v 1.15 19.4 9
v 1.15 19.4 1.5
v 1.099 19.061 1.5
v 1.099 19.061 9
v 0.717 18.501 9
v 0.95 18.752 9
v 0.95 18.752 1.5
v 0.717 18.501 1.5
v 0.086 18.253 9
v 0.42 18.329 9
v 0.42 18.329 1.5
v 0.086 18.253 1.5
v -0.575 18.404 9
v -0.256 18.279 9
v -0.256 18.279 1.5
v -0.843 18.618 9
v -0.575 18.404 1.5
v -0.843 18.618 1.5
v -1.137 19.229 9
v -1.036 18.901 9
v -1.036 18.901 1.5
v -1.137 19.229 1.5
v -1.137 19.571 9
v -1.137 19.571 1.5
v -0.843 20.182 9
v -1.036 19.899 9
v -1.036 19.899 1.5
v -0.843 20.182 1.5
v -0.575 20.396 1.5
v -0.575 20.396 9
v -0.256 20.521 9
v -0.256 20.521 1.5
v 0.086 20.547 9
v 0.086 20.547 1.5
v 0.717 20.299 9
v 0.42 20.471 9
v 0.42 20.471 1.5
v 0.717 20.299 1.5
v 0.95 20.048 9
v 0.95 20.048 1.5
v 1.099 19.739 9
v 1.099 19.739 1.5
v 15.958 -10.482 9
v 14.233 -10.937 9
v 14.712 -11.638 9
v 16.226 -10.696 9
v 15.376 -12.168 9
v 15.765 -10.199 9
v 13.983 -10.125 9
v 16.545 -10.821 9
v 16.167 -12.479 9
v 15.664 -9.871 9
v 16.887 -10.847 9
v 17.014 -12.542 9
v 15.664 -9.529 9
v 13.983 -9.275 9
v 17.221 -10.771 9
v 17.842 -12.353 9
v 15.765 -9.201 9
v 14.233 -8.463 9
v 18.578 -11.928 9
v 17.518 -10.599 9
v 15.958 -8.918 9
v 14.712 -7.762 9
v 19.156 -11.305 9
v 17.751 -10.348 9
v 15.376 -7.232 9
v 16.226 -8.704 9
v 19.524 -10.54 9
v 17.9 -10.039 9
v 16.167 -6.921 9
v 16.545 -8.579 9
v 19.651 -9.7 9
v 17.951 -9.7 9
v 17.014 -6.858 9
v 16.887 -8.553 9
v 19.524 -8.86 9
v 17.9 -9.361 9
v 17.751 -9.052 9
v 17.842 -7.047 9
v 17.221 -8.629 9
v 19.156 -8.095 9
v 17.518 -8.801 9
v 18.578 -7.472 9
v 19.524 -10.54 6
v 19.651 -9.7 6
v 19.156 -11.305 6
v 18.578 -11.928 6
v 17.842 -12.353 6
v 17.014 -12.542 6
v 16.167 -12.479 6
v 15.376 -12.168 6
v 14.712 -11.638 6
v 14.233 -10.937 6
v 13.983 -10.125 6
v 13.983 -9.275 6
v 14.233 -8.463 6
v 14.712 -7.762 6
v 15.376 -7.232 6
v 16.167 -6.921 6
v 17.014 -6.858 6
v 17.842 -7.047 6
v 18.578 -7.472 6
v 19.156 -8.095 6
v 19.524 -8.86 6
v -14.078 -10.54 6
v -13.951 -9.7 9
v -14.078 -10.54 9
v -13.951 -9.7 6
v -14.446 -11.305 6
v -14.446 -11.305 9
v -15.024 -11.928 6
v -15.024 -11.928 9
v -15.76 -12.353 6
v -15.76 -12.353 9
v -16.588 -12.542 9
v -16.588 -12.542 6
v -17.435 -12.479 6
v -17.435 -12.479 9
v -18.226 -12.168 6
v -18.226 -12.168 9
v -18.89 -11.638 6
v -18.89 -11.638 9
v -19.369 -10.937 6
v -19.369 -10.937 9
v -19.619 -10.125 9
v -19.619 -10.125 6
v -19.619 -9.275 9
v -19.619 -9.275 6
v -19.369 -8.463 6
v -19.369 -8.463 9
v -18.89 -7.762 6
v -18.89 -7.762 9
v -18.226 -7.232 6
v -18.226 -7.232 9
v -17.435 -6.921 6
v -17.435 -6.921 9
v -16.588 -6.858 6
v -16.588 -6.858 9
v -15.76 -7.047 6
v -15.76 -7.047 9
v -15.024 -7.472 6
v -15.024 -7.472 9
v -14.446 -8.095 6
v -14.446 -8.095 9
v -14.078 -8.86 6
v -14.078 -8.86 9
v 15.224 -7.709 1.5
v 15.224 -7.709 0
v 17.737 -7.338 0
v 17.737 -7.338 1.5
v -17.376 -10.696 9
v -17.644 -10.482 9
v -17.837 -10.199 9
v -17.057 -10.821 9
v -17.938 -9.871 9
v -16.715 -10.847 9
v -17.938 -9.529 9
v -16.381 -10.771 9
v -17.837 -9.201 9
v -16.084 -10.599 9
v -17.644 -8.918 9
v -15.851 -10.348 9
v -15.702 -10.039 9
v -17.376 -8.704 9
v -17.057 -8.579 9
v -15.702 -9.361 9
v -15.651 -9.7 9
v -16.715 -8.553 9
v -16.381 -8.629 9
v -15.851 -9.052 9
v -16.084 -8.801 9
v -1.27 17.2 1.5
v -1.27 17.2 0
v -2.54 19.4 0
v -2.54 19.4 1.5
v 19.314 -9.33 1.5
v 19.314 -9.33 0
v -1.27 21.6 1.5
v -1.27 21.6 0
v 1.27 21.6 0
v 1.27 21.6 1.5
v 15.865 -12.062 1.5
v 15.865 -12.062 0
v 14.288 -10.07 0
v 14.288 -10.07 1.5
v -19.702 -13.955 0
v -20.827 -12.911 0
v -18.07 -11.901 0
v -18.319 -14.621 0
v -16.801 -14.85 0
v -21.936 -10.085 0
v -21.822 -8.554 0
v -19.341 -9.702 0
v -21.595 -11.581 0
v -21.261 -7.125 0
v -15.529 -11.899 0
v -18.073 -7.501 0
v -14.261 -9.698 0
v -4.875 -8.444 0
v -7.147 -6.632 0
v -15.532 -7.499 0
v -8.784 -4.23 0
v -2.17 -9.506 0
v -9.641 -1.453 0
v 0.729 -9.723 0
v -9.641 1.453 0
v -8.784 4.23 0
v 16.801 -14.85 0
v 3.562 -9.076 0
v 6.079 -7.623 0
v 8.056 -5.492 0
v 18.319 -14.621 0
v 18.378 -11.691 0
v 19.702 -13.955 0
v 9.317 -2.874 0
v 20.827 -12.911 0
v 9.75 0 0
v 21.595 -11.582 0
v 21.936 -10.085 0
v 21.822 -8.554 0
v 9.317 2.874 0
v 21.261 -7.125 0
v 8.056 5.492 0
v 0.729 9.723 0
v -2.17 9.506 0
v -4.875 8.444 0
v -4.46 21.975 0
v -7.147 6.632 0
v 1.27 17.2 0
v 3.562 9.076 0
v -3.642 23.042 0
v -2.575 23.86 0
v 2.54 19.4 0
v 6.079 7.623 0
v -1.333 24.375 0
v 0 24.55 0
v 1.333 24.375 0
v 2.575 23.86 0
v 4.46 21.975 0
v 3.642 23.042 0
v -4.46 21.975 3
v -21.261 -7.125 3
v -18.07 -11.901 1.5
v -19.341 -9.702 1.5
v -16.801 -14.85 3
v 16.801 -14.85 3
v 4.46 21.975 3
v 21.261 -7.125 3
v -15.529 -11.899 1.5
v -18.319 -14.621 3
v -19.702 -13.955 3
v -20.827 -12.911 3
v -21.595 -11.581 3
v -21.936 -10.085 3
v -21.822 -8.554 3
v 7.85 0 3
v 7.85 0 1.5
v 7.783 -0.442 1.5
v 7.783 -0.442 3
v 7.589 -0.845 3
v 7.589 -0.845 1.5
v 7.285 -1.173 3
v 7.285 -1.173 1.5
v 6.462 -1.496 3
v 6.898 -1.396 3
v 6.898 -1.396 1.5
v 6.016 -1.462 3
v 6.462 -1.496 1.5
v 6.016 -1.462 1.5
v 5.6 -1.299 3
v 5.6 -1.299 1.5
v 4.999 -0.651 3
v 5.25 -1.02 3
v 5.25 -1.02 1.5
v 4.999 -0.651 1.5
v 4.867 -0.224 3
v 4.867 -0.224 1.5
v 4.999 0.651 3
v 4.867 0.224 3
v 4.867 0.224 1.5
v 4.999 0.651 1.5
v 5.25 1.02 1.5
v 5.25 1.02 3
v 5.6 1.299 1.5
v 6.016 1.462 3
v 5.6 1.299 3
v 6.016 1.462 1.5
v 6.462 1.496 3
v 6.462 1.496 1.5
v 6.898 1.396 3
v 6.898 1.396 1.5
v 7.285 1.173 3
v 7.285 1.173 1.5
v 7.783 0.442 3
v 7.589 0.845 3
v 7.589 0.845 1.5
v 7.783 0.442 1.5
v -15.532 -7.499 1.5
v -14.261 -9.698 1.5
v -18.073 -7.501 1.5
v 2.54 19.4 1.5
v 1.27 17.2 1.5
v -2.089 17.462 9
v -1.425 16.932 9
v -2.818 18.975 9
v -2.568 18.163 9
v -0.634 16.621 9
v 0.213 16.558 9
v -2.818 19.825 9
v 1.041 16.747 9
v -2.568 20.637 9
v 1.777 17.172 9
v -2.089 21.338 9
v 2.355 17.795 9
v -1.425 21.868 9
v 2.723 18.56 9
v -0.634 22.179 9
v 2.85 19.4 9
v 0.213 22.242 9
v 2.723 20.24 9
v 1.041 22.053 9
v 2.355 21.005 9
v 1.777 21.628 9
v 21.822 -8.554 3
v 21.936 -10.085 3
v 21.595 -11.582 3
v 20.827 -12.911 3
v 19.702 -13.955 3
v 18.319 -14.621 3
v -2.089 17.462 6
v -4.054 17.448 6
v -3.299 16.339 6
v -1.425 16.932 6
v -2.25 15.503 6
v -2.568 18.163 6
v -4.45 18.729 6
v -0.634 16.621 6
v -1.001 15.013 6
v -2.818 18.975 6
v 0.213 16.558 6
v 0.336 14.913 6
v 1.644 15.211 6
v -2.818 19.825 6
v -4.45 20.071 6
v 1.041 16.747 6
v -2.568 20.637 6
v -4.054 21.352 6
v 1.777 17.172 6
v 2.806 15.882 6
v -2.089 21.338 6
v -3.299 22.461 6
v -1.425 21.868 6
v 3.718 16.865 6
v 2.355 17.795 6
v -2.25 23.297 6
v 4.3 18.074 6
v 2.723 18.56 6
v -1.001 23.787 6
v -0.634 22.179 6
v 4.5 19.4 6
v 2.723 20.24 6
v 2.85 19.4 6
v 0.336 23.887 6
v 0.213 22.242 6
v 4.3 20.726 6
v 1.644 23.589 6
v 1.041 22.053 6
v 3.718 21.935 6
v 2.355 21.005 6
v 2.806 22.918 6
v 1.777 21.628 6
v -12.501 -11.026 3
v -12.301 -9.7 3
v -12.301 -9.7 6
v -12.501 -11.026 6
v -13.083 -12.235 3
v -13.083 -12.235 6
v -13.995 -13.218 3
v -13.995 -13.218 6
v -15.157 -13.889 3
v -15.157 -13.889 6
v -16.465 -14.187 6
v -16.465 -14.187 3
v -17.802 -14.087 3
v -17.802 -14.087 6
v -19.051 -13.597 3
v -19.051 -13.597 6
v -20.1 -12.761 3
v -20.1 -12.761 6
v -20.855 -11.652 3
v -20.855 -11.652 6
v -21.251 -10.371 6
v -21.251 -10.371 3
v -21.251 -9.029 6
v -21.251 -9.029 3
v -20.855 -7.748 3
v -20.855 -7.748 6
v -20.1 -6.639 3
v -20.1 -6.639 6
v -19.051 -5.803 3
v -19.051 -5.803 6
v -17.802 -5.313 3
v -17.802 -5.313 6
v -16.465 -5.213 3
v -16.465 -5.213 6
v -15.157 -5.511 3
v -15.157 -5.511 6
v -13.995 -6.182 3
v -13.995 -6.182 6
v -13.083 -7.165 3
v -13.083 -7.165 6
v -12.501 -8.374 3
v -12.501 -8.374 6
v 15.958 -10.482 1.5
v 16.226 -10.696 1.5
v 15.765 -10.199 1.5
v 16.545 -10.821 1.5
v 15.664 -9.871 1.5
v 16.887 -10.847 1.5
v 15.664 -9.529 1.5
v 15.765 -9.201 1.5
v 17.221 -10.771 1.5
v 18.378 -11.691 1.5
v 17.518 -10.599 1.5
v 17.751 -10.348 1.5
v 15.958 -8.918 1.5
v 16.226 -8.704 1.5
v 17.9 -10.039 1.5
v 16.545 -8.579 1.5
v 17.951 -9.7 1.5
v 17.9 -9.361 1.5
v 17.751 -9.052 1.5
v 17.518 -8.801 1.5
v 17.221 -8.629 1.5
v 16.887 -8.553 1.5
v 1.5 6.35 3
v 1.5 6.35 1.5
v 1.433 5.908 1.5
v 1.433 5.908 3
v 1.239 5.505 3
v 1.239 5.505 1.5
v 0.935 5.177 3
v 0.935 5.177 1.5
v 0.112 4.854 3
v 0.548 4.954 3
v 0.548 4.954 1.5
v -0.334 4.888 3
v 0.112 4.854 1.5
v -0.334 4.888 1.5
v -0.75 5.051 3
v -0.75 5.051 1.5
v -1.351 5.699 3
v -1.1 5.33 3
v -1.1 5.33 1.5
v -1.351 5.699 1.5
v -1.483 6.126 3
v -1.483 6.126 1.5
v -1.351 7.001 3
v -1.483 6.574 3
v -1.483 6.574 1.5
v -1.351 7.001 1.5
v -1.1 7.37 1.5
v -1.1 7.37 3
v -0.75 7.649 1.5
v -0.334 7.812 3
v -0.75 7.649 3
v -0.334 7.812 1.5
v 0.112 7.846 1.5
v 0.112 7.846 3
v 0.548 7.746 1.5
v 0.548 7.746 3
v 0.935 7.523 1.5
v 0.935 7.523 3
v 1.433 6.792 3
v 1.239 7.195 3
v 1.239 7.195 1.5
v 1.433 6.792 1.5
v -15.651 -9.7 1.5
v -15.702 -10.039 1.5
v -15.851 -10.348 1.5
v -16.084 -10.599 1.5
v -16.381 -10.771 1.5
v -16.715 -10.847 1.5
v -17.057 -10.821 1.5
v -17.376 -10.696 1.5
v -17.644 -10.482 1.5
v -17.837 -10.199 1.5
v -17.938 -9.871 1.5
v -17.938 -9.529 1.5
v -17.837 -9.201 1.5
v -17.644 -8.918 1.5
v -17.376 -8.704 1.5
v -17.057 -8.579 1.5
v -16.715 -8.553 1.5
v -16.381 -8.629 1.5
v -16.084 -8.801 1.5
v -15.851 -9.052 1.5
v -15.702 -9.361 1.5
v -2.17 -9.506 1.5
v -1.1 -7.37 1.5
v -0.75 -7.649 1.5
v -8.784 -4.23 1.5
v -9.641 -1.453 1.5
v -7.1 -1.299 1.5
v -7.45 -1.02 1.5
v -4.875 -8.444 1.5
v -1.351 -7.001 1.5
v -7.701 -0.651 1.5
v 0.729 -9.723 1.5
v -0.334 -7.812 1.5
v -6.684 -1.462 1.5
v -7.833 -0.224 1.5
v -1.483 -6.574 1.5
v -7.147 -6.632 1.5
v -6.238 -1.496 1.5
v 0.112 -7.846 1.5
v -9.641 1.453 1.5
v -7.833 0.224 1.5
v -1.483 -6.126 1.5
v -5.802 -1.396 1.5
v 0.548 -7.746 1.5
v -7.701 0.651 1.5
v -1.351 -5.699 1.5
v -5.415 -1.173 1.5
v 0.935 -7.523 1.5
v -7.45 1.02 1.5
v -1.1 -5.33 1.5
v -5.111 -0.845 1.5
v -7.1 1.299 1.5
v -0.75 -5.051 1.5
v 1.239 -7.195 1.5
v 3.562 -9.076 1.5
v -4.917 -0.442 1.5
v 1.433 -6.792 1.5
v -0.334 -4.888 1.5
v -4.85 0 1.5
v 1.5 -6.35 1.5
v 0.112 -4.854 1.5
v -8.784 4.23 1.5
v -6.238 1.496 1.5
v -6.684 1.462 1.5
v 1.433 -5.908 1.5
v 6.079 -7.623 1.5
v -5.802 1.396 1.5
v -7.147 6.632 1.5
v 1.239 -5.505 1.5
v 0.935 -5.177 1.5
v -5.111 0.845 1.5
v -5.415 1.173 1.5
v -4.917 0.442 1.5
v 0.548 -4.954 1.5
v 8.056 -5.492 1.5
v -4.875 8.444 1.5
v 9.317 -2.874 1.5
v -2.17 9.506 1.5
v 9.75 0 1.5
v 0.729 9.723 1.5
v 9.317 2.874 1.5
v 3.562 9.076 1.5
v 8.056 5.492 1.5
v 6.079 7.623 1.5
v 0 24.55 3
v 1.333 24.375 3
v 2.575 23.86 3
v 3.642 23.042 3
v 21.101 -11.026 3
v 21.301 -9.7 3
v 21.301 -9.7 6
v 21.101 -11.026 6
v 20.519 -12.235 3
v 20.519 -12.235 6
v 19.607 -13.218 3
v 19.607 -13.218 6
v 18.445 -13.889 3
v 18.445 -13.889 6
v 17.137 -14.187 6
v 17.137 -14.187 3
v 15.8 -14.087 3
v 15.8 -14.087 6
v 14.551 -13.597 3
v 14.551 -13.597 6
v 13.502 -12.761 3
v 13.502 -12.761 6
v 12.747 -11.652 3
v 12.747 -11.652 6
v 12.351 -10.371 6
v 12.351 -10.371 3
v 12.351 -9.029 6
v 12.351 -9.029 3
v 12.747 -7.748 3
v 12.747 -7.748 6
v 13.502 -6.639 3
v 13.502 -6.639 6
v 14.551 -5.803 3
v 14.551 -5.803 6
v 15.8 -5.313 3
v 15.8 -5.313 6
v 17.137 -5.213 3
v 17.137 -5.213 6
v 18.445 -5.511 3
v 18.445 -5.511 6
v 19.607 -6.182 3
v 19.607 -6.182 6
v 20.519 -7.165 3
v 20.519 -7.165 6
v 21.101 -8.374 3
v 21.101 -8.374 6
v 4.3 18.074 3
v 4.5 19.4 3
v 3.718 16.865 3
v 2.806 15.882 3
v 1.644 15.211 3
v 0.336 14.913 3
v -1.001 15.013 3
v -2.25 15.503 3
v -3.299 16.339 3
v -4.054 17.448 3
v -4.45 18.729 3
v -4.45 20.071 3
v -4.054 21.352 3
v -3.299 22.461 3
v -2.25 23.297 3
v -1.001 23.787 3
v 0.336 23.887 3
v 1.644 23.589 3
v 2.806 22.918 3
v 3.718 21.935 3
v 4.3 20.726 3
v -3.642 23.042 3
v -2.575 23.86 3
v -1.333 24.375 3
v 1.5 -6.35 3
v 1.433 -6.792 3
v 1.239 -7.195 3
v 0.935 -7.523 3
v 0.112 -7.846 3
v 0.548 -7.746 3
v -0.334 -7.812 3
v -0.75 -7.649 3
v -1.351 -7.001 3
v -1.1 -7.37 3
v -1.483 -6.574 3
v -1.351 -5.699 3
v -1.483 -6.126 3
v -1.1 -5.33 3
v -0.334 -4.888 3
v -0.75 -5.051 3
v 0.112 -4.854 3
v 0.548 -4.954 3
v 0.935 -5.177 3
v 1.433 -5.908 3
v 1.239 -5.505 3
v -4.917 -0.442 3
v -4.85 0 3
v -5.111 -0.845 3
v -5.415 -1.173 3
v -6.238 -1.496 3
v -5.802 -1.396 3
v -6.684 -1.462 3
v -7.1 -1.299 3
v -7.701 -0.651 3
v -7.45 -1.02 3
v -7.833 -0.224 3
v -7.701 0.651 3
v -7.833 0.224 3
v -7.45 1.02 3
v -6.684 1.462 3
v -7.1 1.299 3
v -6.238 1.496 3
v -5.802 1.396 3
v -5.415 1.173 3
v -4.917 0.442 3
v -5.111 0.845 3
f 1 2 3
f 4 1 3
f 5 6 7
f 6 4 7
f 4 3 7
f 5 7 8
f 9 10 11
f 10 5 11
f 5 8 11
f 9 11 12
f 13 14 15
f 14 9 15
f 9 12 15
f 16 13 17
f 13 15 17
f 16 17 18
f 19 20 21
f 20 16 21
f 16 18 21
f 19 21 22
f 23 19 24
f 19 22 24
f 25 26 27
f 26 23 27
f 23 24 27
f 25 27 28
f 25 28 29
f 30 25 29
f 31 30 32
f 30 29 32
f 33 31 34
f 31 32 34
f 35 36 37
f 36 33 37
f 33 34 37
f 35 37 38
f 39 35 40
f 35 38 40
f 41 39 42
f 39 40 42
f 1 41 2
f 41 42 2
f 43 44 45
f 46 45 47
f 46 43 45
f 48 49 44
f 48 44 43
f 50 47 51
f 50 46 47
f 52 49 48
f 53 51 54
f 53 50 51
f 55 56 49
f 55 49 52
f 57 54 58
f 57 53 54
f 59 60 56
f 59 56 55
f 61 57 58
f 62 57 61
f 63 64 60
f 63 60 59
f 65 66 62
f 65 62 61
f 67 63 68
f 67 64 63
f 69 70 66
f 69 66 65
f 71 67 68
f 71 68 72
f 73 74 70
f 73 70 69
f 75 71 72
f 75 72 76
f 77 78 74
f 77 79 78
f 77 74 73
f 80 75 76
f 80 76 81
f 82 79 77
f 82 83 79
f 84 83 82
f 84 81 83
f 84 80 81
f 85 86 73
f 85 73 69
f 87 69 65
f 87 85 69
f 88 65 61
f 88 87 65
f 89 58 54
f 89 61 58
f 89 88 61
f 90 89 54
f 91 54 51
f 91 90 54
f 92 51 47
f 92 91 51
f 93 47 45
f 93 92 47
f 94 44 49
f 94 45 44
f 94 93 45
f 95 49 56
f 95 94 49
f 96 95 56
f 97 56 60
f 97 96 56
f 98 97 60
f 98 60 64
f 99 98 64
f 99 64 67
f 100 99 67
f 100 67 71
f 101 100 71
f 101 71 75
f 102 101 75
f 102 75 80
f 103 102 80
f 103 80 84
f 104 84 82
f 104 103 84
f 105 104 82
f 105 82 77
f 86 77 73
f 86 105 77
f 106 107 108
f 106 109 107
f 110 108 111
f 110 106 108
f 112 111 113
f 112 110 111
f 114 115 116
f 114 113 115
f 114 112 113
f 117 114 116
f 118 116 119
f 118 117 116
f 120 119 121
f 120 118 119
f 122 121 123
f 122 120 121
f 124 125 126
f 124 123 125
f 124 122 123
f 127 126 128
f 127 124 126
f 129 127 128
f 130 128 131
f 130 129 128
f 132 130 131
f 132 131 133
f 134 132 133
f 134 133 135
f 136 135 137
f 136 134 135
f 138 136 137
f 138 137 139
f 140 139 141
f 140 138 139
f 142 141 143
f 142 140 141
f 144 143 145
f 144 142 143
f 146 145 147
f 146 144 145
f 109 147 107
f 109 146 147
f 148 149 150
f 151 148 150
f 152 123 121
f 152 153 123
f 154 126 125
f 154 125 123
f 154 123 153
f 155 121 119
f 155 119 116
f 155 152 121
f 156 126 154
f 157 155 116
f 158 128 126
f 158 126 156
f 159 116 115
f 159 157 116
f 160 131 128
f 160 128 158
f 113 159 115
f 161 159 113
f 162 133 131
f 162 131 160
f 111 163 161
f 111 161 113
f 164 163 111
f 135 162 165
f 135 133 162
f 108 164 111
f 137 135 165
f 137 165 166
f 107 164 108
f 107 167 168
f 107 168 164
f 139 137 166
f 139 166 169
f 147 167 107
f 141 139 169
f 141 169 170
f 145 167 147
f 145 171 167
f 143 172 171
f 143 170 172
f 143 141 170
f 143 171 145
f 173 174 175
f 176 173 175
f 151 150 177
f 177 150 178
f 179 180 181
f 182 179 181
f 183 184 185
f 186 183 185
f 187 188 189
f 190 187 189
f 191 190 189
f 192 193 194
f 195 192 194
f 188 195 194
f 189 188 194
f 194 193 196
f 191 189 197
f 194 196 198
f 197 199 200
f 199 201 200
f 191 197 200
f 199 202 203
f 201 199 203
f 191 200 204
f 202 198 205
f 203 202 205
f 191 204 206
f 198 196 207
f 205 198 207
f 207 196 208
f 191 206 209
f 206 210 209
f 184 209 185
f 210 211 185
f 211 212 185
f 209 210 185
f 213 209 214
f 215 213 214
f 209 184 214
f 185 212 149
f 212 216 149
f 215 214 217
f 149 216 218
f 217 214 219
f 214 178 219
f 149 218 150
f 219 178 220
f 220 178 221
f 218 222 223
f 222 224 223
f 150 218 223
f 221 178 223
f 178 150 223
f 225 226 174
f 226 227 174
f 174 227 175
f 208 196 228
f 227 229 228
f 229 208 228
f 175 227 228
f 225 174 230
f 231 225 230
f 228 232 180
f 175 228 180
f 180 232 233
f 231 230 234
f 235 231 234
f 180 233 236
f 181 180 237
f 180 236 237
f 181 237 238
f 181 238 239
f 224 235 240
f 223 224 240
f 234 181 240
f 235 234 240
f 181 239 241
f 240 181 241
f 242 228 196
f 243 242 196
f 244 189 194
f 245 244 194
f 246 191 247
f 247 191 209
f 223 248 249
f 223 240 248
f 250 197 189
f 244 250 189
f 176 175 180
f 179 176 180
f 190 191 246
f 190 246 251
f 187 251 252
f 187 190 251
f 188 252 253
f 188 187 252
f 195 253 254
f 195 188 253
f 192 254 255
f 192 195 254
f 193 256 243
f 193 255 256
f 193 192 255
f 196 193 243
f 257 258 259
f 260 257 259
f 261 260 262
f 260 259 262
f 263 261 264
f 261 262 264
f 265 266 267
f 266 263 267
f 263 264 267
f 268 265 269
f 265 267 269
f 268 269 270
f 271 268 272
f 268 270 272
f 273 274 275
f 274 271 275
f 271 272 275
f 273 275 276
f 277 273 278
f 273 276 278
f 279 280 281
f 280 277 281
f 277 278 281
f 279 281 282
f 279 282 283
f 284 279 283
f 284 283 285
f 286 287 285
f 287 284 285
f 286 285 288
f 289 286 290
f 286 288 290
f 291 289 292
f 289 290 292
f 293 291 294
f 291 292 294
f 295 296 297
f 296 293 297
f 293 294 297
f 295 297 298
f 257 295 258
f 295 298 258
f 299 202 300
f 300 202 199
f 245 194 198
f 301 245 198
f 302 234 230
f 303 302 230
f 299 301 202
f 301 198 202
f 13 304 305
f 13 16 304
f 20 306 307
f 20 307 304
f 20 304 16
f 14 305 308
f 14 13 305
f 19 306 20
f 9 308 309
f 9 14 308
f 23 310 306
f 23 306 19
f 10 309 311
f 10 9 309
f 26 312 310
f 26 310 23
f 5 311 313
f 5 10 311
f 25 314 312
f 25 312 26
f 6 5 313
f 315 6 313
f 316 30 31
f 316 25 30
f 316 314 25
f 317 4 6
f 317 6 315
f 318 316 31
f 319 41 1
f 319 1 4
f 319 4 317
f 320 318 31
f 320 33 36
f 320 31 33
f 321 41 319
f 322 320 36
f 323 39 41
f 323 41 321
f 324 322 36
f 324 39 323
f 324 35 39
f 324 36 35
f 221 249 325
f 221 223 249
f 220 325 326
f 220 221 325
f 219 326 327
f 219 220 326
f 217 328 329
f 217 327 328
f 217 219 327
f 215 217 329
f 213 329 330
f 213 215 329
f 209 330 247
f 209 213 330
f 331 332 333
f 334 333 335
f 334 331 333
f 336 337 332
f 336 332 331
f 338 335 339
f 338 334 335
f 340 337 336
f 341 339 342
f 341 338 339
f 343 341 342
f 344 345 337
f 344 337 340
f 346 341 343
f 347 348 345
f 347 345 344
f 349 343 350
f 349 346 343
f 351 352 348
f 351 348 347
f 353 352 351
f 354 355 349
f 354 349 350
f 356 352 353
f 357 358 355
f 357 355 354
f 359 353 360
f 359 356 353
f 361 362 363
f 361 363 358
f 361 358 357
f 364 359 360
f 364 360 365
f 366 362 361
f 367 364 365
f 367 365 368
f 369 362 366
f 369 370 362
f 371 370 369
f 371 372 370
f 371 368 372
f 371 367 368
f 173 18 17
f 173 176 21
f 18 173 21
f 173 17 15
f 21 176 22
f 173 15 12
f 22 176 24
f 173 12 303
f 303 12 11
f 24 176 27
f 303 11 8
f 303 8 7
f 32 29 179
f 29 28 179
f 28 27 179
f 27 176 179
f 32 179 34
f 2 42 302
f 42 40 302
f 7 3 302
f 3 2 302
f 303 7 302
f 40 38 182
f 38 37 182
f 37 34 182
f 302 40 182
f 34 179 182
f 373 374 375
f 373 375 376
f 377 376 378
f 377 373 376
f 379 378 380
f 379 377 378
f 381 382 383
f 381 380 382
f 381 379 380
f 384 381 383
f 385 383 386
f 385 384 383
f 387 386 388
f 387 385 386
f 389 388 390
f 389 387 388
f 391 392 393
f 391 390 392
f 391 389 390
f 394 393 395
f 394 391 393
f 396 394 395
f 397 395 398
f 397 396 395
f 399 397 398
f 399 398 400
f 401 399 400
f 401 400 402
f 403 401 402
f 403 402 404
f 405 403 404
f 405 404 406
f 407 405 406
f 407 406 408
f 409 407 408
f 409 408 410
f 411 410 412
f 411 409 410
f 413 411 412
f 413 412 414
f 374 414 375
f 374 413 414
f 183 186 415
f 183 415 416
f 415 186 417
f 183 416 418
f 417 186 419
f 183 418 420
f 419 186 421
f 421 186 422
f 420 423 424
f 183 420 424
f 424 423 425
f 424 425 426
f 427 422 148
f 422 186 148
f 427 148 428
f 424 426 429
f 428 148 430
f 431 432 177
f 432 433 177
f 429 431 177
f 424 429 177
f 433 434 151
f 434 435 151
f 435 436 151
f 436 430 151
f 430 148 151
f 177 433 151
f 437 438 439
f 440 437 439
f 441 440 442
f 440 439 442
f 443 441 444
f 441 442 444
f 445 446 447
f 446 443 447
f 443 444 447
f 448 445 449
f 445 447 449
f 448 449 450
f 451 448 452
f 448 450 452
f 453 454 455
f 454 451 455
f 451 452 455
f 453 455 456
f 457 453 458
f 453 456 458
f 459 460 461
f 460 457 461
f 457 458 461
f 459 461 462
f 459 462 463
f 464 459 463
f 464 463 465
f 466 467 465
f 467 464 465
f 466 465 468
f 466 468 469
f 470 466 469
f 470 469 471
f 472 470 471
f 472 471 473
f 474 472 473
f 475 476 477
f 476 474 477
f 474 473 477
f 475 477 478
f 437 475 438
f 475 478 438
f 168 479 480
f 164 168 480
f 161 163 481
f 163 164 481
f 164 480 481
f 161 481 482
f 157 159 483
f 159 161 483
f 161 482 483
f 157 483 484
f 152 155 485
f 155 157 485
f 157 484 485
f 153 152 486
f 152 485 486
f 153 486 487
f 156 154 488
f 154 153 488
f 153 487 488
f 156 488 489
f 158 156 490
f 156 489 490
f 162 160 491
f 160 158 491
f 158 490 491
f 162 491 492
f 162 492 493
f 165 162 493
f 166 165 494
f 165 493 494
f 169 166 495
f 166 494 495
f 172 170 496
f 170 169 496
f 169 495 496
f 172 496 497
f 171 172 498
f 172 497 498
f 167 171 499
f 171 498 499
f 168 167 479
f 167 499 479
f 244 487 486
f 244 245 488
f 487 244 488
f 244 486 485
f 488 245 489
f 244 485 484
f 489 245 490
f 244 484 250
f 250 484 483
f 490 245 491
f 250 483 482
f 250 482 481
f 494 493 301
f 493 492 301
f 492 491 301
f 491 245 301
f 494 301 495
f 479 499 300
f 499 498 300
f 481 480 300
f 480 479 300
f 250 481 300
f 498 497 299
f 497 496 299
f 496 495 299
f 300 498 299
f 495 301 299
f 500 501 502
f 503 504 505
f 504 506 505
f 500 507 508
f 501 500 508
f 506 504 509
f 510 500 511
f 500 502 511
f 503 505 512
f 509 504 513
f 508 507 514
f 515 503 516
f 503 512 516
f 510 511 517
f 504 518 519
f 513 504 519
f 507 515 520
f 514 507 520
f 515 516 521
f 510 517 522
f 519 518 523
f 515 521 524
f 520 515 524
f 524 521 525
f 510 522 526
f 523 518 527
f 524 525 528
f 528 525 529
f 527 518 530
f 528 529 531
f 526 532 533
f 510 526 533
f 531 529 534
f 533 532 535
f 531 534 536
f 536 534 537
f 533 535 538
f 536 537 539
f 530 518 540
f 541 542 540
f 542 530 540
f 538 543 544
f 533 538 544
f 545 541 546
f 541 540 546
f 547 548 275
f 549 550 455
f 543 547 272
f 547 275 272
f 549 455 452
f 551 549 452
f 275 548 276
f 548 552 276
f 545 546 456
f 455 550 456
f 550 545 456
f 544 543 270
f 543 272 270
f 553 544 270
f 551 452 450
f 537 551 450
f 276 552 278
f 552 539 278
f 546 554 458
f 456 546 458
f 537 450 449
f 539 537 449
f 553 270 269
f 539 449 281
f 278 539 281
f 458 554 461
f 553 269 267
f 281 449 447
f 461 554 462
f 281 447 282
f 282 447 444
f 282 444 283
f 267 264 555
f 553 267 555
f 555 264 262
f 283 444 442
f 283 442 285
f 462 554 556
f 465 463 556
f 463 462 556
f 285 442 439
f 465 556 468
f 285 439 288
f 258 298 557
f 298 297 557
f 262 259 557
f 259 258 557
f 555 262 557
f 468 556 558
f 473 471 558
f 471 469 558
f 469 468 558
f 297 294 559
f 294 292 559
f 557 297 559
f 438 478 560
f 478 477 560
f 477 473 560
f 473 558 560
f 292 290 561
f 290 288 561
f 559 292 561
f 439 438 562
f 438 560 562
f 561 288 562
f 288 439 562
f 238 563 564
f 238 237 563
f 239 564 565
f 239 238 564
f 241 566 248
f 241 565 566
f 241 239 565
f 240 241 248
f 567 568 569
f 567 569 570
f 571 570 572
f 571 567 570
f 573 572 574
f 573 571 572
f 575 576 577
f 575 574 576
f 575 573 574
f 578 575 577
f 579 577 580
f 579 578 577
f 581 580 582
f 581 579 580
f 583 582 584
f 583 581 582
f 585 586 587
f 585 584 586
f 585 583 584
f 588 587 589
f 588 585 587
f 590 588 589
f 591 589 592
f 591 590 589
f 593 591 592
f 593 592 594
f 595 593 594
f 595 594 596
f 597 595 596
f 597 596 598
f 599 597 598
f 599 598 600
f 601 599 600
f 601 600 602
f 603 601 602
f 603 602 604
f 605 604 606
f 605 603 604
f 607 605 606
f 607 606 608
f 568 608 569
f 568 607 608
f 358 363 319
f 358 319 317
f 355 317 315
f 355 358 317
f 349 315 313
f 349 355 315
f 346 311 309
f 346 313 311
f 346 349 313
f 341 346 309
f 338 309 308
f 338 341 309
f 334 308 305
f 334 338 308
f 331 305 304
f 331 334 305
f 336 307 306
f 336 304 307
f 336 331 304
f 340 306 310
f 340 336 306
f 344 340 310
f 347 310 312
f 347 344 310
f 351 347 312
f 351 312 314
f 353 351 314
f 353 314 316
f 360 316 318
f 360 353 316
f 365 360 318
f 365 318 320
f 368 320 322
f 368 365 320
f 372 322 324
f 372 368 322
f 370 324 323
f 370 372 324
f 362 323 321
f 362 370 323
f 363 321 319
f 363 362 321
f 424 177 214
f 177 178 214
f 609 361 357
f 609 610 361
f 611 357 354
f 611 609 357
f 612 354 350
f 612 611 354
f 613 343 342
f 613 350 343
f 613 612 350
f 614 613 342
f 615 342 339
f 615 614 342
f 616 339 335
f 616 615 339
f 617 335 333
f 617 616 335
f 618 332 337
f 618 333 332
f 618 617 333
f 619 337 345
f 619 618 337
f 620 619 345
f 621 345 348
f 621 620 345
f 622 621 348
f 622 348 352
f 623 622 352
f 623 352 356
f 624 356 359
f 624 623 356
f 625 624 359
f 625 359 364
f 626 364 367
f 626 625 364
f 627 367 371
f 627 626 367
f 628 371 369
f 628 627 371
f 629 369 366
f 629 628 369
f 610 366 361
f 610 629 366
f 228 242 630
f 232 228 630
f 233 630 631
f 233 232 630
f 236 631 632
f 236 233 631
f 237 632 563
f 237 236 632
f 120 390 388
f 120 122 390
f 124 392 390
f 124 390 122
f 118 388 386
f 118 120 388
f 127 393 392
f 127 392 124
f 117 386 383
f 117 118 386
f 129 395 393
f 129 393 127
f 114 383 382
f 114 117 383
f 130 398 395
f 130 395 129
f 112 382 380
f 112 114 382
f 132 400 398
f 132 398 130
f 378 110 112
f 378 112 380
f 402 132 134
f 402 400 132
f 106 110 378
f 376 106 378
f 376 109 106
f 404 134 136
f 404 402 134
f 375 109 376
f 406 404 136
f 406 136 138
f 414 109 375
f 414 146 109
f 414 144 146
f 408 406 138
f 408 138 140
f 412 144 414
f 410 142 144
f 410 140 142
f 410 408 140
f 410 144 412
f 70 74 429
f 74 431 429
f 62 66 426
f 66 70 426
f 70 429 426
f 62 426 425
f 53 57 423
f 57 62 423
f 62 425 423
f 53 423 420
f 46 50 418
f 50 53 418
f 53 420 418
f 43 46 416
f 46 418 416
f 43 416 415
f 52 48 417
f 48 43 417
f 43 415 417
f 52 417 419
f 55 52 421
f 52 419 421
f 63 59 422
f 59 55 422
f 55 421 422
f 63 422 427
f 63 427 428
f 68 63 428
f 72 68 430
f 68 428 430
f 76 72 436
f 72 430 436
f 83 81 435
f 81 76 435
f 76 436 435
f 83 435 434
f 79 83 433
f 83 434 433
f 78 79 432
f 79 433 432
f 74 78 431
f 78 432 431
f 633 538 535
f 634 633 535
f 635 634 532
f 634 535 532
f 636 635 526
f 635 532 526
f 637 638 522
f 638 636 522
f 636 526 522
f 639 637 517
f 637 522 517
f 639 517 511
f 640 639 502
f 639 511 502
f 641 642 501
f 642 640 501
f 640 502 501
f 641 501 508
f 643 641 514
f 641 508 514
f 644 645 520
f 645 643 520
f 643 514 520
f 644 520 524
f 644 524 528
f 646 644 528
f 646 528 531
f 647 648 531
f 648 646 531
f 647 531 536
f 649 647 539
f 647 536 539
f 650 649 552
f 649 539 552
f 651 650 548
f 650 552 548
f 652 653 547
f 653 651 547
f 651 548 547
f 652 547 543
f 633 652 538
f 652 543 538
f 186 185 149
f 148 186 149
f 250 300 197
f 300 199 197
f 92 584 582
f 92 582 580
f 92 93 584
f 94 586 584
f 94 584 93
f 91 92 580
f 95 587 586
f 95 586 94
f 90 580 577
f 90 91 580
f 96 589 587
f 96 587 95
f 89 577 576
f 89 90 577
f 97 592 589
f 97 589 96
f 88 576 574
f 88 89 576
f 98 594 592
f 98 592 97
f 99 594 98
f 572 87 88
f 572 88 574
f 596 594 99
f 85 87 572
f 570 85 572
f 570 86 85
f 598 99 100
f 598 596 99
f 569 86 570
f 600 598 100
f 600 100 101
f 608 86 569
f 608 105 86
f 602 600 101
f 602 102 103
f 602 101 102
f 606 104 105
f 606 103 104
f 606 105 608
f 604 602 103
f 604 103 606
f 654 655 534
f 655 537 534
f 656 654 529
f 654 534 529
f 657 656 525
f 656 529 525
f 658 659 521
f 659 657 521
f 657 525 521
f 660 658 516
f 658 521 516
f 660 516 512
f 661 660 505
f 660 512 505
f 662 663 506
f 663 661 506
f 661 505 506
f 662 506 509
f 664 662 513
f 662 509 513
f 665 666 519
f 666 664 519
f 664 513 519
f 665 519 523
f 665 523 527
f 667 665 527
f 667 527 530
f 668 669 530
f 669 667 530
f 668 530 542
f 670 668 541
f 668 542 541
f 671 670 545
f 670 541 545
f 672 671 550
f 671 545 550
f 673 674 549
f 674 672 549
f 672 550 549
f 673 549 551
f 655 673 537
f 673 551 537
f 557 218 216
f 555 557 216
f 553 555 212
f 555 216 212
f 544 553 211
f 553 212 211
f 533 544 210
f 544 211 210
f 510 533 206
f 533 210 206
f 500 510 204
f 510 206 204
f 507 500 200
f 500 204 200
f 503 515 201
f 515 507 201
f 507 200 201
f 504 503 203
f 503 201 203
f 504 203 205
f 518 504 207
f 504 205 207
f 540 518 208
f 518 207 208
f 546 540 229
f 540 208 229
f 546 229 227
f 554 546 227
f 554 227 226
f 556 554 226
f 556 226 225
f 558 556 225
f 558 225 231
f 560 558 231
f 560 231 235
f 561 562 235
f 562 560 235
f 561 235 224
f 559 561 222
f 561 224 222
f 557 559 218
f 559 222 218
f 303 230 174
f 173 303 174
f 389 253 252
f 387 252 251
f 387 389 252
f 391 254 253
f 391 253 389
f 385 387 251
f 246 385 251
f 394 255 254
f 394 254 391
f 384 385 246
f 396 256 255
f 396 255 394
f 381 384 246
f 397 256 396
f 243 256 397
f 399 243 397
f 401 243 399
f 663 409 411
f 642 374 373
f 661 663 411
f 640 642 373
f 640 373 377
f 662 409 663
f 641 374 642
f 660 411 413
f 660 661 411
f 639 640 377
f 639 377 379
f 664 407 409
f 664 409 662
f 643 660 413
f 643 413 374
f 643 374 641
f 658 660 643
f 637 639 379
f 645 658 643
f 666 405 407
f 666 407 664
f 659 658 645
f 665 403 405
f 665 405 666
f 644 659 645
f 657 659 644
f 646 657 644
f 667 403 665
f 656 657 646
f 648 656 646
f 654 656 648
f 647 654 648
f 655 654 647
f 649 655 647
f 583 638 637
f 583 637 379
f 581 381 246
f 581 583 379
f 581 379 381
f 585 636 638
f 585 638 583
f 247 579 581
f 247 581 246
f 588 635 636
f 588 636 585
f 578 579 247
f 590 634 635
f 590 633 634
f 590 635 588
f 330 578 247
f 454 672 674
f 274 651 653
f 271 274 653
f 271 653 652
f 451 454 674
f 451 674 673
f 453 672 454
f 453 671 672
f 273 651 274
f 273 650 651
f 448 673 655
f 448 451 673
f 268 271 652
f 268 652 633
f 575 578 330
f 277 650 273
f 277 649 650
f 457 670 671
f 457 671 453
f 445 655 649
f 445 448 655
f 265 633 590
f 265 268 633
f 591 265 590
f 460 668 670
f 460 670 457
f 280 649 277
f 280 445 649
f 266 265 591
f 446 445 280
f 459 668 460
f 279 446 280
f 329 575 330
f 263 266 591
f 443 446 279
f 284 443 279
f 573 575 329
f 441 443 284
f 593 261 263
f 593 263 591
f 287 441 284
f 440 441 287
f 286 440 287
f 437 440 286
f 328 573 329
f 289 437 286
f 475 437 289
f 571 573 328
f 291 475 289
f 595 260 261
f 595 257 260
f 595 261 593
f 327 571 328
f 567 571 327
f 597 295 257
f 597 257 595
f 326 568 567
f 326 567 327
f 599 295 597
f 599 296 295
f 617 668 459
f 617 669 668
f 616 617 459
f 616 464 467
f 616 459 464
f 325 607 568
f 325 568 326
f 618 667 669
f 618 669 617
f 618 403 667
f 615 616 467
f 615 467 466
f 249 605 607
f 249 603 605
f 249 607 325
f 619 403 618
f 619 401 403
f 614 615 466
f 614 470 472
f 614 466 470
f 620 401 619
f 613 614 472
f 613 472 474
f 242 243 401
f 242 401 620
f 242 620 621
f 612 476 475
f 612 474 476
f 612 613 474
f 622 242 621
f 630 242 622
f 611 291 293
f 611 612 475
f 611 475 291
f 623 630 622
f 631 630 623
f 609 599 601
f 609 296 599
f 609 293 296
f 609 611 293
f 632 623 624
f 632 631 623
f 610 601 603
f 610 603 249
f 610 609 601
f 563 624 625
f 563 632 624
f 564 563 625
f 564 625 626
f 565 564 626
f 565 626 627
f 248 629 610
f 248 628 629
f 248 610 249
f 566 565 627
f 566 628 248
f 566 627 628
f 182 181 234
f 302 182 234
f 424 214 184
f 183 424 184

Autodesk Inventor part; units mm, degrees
ref_plane "YZ Plane" through (0, 0, 0) normal (1, 0, 0) x (0, 1, 0)
ref_plane "XZ Plane" through (0, 0, 0) normal (0, 1, 0) x (-1, 0, 0)
ref_plane "XY Plane" through (0, 0, 0) normal (0, 0, 1) x (1, 0, 0)
sketch "Skizze1" plane through (0, 0, 0) normal (0, 0, 1) x (1, 0, 0)
  circle A0 centre (0, 0) radius 19.4 construction
  circle A1 centre (0, 0) radius 9.75
  circle A2 centre (0, 19.4) radius 1.15
  line L0 (0, 0) -> (-16.8009, -9.7) construction
  line L1 (0, 34.057) -> (0, -28.3095) construction
  line L2 (-32.8873, 0) -> (32.8873, 0) construction
  circle A3 centre (0, 0) radius 6.35 construction
  circle A4 centre (0, 6.35) radius 1.5
  circle A5 centre (0, -6.35) radius 1.5
  circle A6 centre (6.35, 0) radius 1.5
  circle A7 centre (-6.35, 0) radius 1.5
  arc A8 (0, 24.55) -> (-4.46, 21.975) centre (0, 19.4) ccw
  circle A9 centre (16.8009, -9.7) radius 1.15
  arc A10 (16.8009, -14.85) -> (21.2609, -7.125) centre (16.8009, -9.7) ccw
  circle A11 centre (-16.8009, -9.7) radius 1.15
  arc A12 (-21.2609, -7.125) -> (-16.8009, -14.85) centre (-16.8009, -9.7) ccw
  circle A13 centre (0, 19.4) radius 2.85
  circle A14 centre (16.8009, -9.7) radius 2.85
  circle A15 centre (-16.8009, -9.7) radius 2.85
  circle A16 centre (0, 19.4) radius 4.5
  circle A17 centre (16.8009, -9.7) radius 4.5
  circle A18 centre (-16.8009, -9.7) radius 4.5
  line L3 (-4.46, 21.975) -> (-21.2609, -7.125)
  line L4 (-16.8009, -14.85) -> (16.8009, -14.85)
  line L5 (4.46, 21.975) -> (21.2609, -7.125)
  arc A19 (4.46, 21.975) -> (0, 24.55) centre (0, 19.4) ccw
  circle A20 centre (0, 19.4) radius 2.2 construction
  line L6 (1.2702, 21.6) -> (2.5403, 19.4)
  line L7 (2.5403, 19.4) -> (1.2702, 17.2)
  line L8 (1.2702, 17.2) -> (-1.2702, 17.2)
  line L9 (-1.2702, 17.2) -> (-2.5403, 19.4)
  line L10 (-2.5403, 19.4) -> (-1.2702, 21.6)
  line L11 (-1.2702, 21.6) -> (1.2702, 21.6)
  circle A21 centre (-16.8009, -9.7) radius 2.2 construction
  circle A22 centre (16.8009, -9.7) radius 2.2 construction
  line L12 (-18.0695, -11.9009) -> (-19.3412, -9.7018)
  line L13 (-19.3412, -9.7018) -> (-18.0726, -7.5009)
  line L14 (-18.0726, -7.5009) -> (-15.5322, -7.4991)
  line L15 (-15.5322, -7.4991) -> (-14.2606, -9.6982)
  line L16 (-14.2606, -9.6982) -> (-15.5292, -11.8991)
  line L17 (-15.5292, -11.8991) -> (-18.0695, -11.9009)
  line L18 (15.865, -12.0617) -> (14.2877, -10.0703)
  line L19 (14.2877, -10.0703) -> (15.2236, -7.7087)
  line L20 (15.2236, -7.7087) -> (17.7368, -7.3383)
  line L21 (17.7368, -7.3383) -> (19.3141, -9.3297)
  line L22 (19.3141, -9.3297) -> (18.3782, -11.6913)
  line L23 (18.3782, -11.6913) -> (15.865, -12.0617)
  point P0 (0, 21.6)
  point P1 (-16.8009, -9.7)
  point P2 (-16.7994, -11.9)
  point P3 (17.1216, -11.8765)
  dimension "d31" = 4.4
  dimension "d0" = 38.8
  dimension "d1" = 2.3
  dimension "d2" = 30
  dimension "d3" = 19.5
  dimension "d4" = 12.7
  dimension "d5" = 3
  dimension "d8" = 4
  dimension "d26" = 5.7
  dimension "d30" = 9
extrude "Extrusion1" add sketch "Skizze1" along normal blind 3 contours A1 | A19 L5 A10 L4 A12 L3 A8 | A13 | A14 | A15 | A16 | A17 | A18 | L6 L7 L8 L9 L10 L11 | L12 L13 L14 L15 L16 L17 | L18 L19 L20 L21 L22 L23
extrude "Extrusion3" cut sketch "Skizze1" along normal blind 1.5 contours A1
extrude "Extrusion4" add sketch "Skizze1" along normal blind 3 from surface at 3 contours A13 | A14 | A15 | A16 | A17 | A18 | L6 L7 L8 L9 L10 L11 | L12 L13 L14 L15 L16 L17 | L18 L19 L20 L21 L22 L23
extrude "Extrusion6" add sketch "Skizze1" along normal blind 3 from surface at 6 contours A13 | A14 | A15 | L6 L7 L8 L9 L10 L11 | L12 L13 L14 L15 L16 L17 | L18 L19 L20 L21 L22 L23
extrude "Extrusion8" cut sketch "Skizze1" along normal blind 1.5 contours L6 L7 L8 L9 L10 L11 | L12 L13 L14 L15 L16 L17 | L18 L19 L20 L21 L22 L23
properties part number "PlanetaryHolderTop"
